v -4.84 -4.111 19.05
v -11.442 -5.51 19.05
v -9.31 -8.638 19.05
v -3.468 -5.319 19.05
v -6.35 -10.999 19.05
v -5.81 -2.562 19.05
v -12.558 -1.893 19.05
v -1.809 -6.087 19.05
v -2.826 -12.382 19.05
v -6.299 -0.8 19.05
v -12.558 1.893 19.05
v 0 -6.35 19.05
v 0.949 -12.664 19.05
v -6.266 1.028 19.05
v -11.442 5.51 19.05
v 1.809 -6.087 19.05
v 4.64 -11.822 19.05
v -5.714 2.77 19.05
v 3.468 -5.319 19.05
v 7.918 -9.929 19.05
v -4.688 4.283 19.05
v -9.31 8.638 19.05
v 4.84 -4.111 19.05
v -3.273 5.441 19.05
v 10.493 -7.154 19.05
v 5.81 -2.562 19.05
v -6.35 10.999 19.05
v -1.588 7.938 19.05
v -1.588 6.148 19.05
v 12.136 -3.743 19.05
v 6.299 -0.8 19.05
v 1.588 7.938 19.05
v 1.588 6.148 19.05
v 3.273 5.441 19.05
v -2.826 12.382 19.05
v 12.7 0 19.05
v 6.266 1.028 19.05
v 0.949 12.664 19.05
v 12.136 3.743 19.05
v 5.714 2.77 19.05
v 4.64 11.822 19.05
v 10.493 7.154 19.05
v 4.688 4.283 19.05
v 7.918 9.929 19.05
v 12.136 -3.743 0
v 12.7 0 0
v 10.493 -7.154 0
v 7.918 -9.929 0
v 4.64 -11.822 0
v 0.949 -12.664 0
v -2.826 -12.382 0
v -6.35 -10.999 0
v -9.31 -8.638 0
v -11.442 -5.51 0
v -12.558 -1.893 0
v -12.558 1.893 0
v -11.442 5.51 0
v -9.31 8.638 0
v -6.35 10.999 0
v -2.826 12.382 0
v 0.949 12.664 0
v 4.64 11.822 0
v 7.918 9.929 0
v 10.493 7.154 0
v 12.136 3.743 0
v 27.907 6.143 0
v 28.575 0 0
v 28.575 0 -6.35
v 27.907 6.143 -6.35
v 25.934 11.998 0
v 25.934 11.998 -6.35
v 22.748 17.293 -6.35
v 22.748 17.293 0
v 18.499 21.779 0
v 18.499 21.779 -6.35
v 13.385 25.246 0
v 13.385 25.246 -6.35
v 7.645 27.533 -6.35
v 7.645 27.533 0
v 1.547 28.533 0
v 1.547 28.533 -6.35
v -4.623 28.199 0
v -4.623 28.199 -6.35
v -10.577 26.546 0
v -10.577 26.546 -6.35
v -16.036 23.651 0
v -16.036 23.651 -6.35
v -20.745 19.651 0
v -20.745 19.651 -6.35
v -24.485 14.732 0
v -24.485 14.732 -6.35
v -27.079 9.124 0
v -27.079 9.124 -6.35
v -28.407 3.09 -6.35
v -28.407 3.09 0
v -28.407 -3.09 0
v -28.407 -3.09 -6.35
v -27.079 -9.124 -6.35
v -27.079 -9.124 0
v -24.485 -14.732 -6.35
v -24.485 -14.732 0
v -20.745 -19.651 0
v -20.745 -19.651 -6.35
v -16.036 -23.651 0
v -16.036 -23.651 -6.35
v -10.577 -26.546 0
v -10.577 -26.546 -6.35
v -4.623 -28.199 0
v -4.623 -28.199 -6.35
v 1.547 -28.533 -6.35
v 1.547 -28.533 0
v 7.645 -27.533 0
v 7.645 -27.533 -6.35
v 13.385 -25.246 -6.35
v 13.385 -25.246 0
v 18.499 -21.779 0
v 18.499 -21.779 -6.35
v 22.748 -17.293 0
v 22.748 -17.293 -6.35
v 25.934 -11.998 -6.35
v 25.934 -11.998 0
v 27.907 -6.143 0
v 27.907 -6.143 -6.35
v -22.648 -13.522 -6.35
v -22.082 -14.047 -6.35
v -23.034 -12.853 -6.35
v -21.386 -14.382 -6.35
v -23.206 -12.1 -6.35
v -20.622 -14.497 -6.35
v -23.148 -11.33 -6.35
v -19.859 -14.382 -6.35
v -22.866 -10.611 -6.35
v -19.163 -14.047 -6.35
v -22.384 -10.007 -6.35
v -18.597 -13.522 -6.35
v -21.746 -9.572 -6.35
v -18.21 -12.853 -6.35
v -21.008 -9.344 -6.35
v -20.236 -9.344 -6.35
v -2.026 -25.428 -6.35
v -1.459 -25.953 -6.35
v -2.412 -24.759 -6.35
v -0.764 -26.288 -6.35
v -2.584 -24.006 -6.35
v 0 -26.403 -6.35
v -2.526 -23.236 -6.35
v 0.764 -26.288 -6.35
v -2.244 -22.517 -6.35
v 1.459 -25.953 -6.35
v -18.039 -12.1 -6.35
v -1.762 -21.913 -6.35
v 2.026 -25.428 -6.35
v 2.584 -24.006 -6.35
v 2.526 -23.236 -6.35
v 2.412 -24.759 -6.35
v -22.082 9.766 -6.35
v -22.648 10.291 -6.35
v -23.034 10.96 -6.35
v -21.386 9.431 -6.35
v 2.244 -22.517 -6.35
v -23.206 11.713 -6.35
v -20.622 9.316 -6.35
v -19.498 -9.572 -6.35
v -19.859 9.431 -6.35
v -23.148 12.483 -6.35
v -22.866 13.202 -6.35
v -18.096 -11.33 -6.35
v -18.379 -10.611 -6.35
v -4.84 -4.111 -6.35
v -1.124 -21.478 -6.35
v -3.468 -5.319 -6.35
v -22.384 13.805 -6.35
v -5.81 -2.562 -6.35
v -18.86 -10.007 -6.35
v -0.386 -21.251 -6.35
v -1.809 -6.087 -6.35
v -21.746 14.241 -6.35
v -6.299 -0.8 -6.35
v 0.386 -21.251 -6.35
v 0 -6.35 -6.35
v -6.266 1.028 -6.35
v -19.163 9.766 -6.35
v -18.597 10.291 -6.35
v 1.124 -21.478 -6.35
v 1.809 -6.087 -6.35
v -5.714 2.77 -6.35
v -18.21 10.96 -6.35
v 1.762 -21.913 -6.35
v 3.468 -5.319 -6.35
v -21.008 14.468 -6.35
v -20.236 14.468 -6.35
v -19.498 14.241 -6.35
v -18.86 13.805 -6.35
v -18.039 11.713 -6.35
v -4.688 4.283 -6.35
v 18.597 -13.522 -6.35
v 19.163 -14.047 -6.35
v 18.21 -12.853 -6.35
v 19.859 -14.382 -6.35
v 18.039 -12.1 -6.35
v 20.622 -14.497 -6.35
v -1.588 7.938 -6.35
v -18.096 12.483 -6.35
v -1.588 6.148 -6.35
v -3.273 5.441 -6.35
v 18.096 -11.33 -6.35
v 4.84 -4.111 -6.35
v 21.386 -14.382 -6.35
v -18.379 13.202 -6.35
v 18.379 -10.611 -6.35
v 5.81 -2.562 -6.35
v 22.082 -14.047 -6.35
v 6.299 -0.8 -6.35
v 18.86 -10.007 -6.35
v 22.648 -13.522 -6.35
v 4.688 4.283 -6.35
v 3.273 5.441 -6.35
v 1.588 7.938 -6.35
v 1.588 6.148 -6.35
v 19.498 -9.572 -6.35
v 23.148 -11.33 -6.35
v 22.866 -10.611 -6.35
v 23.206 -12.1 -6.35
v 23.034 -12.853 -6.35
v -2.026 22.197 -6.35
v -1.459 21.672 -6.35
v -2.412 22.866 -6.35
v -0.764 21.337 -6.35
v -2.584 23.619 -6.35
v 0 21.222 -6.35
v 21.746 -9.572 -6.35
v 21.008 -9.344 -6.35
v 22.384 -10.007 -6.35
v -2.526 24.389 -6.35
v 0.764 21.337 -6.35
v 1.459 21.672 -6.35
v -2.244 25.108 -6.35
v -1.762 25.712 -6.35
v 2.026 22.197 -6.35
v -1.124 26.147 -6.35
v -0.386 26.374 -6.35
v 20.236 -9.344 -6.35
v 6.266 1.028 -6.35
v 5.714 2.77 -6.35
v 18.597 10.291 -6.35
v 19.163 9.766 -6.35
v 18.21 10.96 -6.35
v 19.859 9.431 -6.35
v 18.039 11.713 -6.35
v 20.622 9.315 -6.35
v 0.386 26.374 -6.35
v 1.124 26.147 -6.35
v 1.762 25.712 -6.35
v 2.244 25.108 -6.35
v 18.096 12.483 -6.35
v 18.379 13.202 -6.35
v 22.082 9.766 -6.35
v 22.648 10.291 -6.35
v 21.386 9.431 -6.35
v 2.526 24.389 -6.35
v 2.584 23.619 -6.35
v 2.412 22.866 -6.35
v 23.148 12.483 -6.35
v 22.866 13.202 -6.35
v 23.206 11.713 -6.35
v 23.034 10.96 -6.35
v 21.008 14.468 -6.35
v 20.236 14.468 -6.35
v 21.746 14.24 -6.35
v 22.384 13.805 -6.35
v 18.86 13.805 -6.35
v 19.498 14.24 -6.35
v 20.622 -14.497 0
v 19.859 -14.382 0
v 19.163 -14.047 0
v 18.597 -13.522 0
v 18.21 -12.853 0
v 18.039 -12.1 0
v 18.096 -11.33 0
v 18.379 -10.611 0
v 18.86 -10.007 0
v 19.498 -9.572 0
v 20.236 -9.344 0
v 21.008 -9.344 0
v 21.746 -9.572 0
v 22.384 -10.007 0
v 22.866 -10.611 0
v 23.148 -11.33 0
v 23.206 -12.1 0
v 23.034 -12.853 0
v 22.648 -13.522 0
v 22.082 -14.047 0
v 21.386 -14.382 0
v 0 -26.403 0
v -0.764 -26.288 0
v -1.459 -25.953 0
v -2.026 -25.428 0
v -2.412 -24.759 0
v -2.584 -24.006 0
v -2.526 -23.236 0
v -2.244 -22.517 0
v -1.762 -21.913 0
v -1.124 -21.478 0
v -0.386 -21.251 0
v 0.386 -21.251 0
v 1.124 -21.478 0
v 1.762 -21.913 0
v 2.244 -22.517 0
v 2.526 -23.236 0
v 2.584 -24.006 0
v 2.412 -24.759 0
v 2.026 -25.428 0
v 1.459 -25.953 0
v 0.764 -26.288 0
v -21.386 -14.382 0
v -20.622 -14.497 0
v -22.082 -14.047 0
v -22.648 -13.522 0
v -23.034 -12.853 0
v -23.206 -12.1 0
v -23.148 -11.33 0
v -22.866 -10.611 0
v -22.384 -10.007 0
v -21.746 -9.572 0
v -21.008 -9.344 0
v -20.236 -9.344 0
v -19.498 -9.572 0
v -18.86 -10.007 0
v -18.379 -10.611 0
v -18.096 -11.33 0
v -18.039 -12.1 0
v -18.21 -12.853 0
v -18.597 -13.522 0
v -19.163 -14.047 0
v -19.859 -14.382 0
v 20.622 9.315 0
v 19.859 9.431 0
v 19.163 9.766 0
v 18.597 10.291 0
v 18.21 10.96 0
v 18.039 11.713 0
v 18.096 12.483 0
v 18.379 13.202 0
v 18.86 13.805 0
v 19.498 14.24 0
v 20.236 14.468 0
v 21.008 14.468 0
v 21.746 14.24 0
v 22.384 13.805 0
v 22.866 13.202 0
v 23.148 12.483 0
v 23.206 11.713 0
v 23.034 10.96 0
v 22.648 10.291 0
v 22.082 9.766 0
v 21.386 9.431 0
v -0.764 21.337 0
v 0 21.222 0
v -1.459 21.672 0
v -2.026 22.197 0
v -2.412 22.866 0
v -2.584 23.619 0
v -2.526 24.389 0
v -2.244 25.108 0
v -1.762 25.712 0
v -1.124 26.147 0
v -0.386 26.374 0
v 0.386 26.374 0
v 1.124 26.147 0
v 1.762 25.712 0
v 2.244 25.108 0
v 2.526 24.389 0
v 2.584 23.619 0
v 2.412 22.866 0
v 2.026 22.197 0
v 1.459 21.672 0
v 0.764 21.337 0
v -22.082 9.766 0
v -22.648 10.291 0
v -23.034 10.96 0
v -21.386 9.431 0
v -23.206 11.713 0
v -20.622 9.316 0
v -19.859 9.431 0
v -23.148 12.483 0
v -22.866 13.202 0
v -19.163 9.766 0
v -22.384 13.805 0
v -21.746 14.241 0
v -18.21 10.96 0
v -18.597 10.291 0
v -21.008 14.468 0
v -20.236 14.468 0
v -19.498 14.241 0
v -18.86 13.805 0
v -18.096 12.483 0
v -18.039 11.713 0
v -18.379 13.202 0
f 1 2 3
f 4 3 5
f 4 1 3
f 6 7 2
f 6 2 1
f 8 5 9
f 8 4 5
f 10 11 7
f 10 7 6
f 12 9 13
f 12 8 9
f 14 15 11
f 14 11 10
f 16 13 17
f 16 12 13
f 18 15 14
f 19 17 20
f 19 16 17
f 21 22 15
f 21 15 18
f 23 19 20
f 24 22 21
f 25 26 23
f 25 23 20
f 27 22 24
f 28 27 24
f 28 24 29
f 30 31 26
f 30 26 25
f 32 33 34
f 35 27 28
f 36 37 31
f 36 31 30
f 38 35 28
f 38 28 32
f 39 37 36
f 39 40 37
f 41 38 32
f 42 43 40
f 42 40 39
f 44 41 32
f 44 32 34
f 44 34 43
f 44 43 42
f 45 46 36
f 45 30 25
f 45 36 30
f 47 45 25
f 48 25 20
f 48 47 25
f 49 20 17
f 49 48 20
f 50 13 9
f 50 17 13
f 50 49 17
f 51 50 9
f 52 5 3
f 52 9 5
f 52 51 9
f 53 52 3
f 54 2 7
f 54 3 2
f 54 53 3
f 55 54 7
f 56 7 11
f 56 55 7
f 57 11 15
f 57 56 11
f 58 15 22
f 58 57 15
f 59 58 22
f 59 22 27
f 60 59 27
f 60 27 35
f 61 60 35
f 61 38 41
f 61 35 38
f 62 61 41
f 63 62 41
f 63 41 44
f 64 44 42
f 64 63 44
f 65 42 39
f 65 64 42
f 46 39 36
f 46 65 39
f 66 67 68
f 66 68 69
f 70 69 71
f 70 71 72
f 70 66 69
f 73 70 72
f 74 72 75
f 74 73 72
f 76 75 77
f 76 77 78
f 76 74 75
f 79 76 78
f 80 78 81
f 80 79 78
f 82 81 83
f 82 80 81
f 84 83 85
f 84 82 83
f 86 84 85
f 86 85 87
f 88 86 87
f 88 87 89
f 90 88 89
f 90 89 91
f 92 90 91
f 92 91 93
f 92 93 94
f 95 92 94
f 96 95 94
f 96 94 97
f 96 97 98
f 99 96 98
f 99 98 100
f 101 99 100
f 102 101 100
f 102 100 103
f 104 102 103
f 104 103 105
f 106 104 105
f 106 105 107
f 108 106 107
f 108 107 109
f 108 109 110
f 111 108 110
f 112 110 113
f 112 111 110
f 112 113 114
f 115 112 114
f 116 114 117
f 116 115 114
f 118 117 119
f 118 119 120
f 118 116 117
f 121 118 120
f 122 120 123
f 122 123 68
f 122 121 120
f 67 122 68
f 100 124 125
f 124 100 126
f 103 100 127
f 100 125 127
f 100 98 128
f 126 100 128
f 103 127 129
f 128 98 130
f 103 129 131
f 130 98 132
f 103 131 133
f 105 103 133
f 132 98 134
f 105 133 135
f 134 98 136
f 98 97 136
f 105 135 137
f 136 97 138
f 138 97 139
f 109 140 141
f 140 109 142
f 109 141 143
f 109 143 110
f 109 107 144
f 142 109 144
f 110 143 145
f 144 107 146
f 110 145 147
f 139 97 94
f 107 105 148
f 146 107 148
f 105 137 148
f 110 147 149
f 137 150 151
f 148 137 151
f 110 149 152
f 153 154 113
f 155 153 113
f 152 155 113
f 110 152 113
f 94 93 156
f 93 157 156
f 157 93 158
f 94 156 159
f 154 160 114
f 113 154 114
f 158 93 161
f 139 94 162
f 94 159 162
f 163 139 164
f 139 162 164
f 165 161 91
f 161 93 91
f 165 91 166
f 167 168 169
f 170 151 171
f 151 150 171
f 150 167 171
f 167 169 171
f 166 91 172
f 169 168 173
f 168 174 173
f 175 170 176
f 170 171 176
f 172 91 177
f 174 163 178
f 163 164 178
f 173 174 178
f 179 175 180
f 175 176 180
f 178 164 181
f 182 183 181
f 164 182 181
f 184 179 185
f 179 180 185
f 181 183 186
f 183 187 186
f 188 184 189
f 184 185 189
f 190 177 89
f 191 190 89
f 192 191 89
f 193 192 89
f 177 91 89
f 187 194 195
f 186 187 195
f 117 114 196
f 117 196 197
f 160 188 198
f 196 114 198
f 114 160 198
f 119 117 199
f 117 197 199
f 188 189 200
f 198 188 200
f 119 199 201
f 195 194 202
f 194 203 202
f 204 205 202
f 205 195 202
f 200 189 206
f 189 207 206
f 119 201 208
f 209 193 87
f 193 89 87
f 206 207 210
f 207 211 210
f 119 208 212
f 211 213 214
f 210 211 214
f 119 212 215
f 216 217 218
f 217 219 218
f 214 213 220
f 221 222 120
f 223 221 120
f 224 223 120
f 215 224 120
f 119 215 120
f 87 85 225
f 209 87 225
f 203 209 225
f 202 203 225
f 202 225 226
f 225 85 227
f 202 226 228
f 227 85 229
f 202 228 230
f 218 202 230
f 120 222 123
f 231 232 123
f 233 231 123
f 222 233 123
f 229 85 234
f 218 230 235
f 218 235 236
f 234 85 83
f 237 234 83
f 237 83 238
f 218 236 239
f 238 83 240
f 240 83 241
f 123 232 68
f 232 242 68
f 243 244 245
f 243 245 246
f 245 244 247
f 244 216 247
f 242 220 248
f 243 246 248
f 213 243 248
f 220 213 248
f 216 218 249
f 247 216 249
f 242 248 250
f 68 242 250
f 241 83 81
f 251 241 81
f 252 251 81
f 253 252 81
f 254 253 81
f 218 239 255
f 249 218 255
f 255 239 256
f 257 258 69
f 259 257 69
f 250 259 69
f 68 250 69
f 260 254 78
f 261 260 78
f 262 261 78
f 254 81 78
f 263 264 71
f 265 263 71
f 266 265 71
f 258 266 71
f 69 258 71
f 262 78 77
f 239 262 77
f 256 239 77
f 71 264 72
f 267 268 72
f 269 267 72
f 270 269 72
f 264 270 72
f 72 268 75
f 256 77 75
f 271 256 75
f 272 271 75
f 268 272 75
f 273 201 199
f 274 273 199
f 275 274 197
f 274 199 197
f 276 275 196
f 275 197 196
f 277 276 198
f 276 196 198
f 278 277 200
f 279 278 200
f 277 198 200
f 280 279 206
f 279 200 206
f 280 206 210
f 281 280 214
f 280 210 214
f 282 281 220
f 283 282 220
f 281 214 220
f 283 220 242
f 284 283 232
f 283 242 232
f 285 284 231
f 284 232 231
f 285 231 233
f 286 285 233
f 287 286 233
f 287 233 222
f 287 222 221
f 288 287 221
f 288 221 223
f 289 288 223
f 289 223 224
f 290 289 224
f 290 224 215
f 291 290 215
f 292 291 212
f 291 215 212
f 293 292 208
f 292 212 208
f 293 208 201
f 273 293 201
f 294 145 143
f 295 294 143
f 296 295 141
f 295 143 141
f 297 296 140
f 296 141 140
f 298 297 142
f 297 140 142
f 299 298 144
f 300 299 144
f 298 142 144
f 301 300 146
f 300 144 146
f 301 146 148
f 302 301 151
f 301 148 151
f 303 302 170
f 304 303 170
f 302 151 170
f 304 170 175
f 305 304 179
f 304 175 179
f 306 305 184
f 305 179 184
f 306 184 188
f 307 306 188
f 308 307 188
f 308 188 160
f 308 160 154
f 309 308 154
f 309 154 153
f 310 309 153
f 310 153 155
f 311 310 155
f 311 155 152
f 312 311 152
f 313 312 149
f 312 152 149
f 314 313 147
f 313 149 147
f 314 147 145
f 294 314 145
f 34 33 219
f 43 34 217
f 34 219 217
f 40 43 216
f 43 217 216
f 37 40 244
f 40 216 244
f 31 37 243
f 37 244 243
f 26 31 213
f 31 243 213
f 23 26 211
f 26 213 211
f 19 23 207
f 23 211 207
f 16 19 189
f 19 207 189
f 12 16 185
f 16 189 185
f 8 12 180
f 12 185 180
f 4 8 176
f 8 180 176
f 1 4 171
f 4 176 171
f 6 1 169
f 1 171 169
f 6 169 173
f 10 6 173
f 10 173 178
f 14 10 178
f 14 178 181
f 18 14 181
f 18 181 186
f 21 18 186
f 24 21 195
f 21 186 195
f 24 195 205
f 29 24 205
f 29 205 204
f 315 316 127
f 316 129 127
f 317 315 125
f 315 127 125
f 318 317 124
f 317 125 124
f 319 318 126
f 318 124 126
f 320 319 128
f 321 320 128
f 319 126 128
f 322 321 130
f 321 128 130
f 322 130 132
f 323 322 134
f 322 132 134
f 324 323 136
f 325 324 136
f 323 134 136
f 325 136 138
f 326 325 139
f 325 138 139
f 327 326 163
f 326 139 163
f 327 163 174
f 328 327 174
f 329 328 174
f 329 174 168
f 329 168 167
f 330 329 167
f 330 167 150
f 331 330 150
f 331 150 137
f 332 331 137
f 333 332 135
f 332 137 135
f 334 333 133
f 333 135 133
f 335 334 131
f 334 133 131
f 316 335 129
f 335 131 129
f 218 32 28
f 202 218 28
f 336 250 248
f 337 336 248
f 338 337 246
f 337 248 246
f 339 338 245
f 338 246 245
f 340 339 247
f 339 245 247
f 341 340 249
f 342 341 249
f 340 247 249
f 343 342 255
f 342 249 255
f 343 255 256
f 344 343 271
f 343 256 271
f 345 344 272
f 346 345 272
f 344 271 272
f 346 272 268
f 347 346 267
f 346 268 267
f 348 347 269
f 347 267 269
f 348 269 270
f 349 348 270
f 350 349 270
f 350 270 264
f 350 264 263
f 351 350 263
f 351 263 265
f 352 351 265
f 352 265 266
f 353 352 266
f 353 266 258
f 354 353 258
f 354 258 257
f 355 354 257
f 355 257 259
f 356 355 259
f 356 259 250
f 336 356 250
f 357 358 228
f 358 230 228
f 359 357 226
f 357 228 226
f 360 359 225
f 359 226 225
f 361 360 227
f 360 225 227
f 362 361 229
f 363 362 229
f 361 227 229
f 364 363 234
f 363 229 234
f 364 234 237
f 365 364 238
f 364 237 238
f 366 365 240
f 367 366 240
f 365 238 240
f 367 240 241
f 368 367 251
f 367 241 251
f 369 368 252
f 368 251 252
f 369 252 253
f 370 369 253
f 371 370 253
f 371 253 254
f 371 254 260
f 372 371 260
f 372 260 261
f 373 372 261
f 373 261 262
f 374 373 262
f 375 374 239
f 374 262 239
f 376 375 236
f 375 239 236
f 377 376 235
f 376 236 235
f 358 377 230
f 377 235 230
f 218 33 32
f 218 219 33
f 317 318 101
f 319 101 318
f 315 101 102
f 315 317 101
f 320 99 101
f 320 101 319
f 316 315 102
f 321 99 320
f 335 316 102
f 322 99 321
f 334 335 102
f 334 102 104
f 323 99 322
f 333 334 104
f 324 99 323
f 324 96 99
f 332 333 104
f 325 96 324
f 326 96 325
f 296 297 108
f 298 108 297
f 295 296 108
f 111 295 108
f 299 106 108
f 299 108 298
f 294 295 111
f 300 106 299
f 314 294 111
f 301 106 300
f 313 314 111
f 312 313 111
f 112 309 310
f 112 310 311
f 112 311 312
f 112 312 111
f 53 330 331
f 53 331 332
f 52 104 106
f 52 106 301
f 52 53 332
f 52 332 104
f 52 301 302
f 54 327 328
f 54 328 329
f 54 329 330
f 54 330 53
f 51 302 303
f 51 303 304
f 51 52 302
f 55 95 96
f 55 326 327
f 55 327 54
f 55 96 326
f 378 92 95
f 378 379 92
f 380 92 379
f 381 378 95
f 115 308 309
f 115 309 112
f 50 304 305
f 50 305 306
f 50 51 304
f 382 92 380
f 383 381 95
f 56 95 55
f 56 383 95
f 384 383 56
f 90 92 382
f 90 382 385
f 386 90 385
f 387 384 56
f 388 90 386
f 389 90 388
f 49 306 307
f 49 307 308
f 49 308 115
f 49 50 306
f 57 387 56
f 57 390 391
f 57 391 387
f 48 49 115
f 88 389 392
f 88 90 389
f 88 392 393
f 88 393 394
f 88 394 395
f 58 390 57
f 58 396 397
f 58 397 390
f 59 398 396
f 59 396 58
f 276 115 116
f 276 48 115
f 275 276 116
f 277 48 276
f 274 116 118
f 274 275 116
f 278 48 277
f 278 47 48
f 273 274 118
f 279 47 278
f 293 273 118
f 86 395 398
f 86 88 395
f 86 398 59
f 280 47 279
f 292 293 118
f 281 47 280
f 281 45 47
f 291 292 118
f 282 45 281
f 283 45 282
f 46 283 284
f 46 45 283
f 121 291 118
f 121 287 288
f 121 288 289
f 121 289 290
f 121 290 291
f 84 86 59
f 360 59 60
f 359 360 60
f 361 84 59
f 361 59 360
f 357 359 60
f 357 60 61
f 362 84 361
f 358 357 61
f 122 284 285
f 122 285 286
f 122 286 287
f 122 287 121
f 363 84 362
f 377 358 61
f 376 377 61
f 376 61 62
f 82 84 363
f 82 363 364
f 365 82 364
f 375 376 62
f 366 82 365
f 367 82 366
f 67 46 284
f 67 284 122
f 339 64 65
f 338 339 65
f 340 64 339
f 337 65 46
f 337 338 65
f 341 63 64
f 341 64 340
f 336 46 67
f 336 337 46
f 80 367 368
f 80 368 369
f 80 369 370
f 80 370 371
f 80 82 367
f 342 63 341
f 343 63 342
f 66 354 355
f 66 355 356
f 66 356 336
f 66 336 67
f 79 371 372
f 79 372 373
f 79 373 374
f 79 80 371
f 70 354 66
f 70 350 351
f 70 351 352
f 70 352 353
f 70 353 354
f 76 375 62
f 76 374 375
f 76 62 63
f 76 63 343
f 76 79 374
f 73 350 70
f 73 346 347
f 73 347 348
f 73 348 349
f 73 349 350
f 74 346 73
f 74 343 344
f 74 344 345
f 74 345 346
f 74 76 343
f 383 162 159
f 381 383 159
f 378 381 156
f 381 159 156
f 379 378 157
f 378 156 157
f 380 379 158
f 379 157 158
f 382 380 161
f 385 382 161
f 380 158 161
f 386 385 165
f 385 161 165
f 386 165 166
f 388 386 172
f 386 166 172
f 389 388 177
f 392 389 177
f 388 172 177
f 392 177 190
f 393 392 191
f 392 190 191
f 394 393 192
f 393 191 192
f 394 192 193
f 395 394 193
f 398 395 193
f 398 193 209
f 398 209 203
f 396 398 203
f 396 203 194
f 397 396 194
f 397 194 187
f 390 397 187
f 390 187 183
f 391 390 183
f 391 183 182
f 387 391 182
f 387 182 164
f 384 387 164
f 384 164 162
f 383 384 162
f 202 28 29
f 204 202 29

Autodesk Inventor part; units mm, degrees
ref_plane "YZ Plane" through (0, 0, 0) normal (1, 0, 0) x (0, 1, 0)
ref_plane "XZ Plane" through (0, 0, 0) normal (0, 1, 0) x (-1, 0, 0)
ref_plane "XY Plane" through (0, 0, 0) normal (0, 0, 1) x (1, 0, 0)
sketch "Sketch1" plane through (0, 0, 0) normal (0, 0, 1) x (1, 0, 0)
  circle A0 centre (0, 0) radius 28.575
  circle A1 centre (0, 0) radius 6.35
  line L0 (-1.5875, 4.7625) -> (1.5875, 4.7625)
  line L1 (1.5875, 4.7625) -> (1.5875, 7.9375)
  line L2 (1.5875, 7.9375) -> (-1.5875, 7.9375)
  line L3 (-1.5875, 7.9375) -> (-1.5875, 4.7625)
  line L4 (1.5875, 6.35) -> (-1.5875, 6.35)
  circle A2 centre (0, 0) radius 12.7
  point P0 (0, 4.7625)
  point P1 (0, 23.8125)
  point P2 (-20.6222, 11.9063)
  point P3 (-20.6222, -11.9062)
  point P4 (0, -23.8125)
  point P5 (20.6222, -11.9063)
  point P6 (20.6222, 11.9062)
  dimension "d0" = 57.15
  dimension "d1" = 12.7
  dimension "d2" = 3.175
  dimension "d3" = 3.175
  dimension "d6" = 360
  dimension "d8" = 23.8125
  dimension "d9" = 25.4
extrude "Extrusion1" add sketch "Sketch1" against normal blind 6.35 contours A0 | A2
extrude "Extrusion2" add sketch "Sketch1" along normal blind 19.05 contours A2
hole "Hole1" at (0, 23.8125, 0) at (-20.6222, 11.9063, 0) at (-20.6222, -11.9062, 0) at (0, -23.8125, 0) at (20.6222, -11.9063, 0) at (20.6222, 11.9062, 0) direction (0, 0, -1) diameter 5.1816 depth 25.4 tip angle 118
properties part number "wheel hub"
